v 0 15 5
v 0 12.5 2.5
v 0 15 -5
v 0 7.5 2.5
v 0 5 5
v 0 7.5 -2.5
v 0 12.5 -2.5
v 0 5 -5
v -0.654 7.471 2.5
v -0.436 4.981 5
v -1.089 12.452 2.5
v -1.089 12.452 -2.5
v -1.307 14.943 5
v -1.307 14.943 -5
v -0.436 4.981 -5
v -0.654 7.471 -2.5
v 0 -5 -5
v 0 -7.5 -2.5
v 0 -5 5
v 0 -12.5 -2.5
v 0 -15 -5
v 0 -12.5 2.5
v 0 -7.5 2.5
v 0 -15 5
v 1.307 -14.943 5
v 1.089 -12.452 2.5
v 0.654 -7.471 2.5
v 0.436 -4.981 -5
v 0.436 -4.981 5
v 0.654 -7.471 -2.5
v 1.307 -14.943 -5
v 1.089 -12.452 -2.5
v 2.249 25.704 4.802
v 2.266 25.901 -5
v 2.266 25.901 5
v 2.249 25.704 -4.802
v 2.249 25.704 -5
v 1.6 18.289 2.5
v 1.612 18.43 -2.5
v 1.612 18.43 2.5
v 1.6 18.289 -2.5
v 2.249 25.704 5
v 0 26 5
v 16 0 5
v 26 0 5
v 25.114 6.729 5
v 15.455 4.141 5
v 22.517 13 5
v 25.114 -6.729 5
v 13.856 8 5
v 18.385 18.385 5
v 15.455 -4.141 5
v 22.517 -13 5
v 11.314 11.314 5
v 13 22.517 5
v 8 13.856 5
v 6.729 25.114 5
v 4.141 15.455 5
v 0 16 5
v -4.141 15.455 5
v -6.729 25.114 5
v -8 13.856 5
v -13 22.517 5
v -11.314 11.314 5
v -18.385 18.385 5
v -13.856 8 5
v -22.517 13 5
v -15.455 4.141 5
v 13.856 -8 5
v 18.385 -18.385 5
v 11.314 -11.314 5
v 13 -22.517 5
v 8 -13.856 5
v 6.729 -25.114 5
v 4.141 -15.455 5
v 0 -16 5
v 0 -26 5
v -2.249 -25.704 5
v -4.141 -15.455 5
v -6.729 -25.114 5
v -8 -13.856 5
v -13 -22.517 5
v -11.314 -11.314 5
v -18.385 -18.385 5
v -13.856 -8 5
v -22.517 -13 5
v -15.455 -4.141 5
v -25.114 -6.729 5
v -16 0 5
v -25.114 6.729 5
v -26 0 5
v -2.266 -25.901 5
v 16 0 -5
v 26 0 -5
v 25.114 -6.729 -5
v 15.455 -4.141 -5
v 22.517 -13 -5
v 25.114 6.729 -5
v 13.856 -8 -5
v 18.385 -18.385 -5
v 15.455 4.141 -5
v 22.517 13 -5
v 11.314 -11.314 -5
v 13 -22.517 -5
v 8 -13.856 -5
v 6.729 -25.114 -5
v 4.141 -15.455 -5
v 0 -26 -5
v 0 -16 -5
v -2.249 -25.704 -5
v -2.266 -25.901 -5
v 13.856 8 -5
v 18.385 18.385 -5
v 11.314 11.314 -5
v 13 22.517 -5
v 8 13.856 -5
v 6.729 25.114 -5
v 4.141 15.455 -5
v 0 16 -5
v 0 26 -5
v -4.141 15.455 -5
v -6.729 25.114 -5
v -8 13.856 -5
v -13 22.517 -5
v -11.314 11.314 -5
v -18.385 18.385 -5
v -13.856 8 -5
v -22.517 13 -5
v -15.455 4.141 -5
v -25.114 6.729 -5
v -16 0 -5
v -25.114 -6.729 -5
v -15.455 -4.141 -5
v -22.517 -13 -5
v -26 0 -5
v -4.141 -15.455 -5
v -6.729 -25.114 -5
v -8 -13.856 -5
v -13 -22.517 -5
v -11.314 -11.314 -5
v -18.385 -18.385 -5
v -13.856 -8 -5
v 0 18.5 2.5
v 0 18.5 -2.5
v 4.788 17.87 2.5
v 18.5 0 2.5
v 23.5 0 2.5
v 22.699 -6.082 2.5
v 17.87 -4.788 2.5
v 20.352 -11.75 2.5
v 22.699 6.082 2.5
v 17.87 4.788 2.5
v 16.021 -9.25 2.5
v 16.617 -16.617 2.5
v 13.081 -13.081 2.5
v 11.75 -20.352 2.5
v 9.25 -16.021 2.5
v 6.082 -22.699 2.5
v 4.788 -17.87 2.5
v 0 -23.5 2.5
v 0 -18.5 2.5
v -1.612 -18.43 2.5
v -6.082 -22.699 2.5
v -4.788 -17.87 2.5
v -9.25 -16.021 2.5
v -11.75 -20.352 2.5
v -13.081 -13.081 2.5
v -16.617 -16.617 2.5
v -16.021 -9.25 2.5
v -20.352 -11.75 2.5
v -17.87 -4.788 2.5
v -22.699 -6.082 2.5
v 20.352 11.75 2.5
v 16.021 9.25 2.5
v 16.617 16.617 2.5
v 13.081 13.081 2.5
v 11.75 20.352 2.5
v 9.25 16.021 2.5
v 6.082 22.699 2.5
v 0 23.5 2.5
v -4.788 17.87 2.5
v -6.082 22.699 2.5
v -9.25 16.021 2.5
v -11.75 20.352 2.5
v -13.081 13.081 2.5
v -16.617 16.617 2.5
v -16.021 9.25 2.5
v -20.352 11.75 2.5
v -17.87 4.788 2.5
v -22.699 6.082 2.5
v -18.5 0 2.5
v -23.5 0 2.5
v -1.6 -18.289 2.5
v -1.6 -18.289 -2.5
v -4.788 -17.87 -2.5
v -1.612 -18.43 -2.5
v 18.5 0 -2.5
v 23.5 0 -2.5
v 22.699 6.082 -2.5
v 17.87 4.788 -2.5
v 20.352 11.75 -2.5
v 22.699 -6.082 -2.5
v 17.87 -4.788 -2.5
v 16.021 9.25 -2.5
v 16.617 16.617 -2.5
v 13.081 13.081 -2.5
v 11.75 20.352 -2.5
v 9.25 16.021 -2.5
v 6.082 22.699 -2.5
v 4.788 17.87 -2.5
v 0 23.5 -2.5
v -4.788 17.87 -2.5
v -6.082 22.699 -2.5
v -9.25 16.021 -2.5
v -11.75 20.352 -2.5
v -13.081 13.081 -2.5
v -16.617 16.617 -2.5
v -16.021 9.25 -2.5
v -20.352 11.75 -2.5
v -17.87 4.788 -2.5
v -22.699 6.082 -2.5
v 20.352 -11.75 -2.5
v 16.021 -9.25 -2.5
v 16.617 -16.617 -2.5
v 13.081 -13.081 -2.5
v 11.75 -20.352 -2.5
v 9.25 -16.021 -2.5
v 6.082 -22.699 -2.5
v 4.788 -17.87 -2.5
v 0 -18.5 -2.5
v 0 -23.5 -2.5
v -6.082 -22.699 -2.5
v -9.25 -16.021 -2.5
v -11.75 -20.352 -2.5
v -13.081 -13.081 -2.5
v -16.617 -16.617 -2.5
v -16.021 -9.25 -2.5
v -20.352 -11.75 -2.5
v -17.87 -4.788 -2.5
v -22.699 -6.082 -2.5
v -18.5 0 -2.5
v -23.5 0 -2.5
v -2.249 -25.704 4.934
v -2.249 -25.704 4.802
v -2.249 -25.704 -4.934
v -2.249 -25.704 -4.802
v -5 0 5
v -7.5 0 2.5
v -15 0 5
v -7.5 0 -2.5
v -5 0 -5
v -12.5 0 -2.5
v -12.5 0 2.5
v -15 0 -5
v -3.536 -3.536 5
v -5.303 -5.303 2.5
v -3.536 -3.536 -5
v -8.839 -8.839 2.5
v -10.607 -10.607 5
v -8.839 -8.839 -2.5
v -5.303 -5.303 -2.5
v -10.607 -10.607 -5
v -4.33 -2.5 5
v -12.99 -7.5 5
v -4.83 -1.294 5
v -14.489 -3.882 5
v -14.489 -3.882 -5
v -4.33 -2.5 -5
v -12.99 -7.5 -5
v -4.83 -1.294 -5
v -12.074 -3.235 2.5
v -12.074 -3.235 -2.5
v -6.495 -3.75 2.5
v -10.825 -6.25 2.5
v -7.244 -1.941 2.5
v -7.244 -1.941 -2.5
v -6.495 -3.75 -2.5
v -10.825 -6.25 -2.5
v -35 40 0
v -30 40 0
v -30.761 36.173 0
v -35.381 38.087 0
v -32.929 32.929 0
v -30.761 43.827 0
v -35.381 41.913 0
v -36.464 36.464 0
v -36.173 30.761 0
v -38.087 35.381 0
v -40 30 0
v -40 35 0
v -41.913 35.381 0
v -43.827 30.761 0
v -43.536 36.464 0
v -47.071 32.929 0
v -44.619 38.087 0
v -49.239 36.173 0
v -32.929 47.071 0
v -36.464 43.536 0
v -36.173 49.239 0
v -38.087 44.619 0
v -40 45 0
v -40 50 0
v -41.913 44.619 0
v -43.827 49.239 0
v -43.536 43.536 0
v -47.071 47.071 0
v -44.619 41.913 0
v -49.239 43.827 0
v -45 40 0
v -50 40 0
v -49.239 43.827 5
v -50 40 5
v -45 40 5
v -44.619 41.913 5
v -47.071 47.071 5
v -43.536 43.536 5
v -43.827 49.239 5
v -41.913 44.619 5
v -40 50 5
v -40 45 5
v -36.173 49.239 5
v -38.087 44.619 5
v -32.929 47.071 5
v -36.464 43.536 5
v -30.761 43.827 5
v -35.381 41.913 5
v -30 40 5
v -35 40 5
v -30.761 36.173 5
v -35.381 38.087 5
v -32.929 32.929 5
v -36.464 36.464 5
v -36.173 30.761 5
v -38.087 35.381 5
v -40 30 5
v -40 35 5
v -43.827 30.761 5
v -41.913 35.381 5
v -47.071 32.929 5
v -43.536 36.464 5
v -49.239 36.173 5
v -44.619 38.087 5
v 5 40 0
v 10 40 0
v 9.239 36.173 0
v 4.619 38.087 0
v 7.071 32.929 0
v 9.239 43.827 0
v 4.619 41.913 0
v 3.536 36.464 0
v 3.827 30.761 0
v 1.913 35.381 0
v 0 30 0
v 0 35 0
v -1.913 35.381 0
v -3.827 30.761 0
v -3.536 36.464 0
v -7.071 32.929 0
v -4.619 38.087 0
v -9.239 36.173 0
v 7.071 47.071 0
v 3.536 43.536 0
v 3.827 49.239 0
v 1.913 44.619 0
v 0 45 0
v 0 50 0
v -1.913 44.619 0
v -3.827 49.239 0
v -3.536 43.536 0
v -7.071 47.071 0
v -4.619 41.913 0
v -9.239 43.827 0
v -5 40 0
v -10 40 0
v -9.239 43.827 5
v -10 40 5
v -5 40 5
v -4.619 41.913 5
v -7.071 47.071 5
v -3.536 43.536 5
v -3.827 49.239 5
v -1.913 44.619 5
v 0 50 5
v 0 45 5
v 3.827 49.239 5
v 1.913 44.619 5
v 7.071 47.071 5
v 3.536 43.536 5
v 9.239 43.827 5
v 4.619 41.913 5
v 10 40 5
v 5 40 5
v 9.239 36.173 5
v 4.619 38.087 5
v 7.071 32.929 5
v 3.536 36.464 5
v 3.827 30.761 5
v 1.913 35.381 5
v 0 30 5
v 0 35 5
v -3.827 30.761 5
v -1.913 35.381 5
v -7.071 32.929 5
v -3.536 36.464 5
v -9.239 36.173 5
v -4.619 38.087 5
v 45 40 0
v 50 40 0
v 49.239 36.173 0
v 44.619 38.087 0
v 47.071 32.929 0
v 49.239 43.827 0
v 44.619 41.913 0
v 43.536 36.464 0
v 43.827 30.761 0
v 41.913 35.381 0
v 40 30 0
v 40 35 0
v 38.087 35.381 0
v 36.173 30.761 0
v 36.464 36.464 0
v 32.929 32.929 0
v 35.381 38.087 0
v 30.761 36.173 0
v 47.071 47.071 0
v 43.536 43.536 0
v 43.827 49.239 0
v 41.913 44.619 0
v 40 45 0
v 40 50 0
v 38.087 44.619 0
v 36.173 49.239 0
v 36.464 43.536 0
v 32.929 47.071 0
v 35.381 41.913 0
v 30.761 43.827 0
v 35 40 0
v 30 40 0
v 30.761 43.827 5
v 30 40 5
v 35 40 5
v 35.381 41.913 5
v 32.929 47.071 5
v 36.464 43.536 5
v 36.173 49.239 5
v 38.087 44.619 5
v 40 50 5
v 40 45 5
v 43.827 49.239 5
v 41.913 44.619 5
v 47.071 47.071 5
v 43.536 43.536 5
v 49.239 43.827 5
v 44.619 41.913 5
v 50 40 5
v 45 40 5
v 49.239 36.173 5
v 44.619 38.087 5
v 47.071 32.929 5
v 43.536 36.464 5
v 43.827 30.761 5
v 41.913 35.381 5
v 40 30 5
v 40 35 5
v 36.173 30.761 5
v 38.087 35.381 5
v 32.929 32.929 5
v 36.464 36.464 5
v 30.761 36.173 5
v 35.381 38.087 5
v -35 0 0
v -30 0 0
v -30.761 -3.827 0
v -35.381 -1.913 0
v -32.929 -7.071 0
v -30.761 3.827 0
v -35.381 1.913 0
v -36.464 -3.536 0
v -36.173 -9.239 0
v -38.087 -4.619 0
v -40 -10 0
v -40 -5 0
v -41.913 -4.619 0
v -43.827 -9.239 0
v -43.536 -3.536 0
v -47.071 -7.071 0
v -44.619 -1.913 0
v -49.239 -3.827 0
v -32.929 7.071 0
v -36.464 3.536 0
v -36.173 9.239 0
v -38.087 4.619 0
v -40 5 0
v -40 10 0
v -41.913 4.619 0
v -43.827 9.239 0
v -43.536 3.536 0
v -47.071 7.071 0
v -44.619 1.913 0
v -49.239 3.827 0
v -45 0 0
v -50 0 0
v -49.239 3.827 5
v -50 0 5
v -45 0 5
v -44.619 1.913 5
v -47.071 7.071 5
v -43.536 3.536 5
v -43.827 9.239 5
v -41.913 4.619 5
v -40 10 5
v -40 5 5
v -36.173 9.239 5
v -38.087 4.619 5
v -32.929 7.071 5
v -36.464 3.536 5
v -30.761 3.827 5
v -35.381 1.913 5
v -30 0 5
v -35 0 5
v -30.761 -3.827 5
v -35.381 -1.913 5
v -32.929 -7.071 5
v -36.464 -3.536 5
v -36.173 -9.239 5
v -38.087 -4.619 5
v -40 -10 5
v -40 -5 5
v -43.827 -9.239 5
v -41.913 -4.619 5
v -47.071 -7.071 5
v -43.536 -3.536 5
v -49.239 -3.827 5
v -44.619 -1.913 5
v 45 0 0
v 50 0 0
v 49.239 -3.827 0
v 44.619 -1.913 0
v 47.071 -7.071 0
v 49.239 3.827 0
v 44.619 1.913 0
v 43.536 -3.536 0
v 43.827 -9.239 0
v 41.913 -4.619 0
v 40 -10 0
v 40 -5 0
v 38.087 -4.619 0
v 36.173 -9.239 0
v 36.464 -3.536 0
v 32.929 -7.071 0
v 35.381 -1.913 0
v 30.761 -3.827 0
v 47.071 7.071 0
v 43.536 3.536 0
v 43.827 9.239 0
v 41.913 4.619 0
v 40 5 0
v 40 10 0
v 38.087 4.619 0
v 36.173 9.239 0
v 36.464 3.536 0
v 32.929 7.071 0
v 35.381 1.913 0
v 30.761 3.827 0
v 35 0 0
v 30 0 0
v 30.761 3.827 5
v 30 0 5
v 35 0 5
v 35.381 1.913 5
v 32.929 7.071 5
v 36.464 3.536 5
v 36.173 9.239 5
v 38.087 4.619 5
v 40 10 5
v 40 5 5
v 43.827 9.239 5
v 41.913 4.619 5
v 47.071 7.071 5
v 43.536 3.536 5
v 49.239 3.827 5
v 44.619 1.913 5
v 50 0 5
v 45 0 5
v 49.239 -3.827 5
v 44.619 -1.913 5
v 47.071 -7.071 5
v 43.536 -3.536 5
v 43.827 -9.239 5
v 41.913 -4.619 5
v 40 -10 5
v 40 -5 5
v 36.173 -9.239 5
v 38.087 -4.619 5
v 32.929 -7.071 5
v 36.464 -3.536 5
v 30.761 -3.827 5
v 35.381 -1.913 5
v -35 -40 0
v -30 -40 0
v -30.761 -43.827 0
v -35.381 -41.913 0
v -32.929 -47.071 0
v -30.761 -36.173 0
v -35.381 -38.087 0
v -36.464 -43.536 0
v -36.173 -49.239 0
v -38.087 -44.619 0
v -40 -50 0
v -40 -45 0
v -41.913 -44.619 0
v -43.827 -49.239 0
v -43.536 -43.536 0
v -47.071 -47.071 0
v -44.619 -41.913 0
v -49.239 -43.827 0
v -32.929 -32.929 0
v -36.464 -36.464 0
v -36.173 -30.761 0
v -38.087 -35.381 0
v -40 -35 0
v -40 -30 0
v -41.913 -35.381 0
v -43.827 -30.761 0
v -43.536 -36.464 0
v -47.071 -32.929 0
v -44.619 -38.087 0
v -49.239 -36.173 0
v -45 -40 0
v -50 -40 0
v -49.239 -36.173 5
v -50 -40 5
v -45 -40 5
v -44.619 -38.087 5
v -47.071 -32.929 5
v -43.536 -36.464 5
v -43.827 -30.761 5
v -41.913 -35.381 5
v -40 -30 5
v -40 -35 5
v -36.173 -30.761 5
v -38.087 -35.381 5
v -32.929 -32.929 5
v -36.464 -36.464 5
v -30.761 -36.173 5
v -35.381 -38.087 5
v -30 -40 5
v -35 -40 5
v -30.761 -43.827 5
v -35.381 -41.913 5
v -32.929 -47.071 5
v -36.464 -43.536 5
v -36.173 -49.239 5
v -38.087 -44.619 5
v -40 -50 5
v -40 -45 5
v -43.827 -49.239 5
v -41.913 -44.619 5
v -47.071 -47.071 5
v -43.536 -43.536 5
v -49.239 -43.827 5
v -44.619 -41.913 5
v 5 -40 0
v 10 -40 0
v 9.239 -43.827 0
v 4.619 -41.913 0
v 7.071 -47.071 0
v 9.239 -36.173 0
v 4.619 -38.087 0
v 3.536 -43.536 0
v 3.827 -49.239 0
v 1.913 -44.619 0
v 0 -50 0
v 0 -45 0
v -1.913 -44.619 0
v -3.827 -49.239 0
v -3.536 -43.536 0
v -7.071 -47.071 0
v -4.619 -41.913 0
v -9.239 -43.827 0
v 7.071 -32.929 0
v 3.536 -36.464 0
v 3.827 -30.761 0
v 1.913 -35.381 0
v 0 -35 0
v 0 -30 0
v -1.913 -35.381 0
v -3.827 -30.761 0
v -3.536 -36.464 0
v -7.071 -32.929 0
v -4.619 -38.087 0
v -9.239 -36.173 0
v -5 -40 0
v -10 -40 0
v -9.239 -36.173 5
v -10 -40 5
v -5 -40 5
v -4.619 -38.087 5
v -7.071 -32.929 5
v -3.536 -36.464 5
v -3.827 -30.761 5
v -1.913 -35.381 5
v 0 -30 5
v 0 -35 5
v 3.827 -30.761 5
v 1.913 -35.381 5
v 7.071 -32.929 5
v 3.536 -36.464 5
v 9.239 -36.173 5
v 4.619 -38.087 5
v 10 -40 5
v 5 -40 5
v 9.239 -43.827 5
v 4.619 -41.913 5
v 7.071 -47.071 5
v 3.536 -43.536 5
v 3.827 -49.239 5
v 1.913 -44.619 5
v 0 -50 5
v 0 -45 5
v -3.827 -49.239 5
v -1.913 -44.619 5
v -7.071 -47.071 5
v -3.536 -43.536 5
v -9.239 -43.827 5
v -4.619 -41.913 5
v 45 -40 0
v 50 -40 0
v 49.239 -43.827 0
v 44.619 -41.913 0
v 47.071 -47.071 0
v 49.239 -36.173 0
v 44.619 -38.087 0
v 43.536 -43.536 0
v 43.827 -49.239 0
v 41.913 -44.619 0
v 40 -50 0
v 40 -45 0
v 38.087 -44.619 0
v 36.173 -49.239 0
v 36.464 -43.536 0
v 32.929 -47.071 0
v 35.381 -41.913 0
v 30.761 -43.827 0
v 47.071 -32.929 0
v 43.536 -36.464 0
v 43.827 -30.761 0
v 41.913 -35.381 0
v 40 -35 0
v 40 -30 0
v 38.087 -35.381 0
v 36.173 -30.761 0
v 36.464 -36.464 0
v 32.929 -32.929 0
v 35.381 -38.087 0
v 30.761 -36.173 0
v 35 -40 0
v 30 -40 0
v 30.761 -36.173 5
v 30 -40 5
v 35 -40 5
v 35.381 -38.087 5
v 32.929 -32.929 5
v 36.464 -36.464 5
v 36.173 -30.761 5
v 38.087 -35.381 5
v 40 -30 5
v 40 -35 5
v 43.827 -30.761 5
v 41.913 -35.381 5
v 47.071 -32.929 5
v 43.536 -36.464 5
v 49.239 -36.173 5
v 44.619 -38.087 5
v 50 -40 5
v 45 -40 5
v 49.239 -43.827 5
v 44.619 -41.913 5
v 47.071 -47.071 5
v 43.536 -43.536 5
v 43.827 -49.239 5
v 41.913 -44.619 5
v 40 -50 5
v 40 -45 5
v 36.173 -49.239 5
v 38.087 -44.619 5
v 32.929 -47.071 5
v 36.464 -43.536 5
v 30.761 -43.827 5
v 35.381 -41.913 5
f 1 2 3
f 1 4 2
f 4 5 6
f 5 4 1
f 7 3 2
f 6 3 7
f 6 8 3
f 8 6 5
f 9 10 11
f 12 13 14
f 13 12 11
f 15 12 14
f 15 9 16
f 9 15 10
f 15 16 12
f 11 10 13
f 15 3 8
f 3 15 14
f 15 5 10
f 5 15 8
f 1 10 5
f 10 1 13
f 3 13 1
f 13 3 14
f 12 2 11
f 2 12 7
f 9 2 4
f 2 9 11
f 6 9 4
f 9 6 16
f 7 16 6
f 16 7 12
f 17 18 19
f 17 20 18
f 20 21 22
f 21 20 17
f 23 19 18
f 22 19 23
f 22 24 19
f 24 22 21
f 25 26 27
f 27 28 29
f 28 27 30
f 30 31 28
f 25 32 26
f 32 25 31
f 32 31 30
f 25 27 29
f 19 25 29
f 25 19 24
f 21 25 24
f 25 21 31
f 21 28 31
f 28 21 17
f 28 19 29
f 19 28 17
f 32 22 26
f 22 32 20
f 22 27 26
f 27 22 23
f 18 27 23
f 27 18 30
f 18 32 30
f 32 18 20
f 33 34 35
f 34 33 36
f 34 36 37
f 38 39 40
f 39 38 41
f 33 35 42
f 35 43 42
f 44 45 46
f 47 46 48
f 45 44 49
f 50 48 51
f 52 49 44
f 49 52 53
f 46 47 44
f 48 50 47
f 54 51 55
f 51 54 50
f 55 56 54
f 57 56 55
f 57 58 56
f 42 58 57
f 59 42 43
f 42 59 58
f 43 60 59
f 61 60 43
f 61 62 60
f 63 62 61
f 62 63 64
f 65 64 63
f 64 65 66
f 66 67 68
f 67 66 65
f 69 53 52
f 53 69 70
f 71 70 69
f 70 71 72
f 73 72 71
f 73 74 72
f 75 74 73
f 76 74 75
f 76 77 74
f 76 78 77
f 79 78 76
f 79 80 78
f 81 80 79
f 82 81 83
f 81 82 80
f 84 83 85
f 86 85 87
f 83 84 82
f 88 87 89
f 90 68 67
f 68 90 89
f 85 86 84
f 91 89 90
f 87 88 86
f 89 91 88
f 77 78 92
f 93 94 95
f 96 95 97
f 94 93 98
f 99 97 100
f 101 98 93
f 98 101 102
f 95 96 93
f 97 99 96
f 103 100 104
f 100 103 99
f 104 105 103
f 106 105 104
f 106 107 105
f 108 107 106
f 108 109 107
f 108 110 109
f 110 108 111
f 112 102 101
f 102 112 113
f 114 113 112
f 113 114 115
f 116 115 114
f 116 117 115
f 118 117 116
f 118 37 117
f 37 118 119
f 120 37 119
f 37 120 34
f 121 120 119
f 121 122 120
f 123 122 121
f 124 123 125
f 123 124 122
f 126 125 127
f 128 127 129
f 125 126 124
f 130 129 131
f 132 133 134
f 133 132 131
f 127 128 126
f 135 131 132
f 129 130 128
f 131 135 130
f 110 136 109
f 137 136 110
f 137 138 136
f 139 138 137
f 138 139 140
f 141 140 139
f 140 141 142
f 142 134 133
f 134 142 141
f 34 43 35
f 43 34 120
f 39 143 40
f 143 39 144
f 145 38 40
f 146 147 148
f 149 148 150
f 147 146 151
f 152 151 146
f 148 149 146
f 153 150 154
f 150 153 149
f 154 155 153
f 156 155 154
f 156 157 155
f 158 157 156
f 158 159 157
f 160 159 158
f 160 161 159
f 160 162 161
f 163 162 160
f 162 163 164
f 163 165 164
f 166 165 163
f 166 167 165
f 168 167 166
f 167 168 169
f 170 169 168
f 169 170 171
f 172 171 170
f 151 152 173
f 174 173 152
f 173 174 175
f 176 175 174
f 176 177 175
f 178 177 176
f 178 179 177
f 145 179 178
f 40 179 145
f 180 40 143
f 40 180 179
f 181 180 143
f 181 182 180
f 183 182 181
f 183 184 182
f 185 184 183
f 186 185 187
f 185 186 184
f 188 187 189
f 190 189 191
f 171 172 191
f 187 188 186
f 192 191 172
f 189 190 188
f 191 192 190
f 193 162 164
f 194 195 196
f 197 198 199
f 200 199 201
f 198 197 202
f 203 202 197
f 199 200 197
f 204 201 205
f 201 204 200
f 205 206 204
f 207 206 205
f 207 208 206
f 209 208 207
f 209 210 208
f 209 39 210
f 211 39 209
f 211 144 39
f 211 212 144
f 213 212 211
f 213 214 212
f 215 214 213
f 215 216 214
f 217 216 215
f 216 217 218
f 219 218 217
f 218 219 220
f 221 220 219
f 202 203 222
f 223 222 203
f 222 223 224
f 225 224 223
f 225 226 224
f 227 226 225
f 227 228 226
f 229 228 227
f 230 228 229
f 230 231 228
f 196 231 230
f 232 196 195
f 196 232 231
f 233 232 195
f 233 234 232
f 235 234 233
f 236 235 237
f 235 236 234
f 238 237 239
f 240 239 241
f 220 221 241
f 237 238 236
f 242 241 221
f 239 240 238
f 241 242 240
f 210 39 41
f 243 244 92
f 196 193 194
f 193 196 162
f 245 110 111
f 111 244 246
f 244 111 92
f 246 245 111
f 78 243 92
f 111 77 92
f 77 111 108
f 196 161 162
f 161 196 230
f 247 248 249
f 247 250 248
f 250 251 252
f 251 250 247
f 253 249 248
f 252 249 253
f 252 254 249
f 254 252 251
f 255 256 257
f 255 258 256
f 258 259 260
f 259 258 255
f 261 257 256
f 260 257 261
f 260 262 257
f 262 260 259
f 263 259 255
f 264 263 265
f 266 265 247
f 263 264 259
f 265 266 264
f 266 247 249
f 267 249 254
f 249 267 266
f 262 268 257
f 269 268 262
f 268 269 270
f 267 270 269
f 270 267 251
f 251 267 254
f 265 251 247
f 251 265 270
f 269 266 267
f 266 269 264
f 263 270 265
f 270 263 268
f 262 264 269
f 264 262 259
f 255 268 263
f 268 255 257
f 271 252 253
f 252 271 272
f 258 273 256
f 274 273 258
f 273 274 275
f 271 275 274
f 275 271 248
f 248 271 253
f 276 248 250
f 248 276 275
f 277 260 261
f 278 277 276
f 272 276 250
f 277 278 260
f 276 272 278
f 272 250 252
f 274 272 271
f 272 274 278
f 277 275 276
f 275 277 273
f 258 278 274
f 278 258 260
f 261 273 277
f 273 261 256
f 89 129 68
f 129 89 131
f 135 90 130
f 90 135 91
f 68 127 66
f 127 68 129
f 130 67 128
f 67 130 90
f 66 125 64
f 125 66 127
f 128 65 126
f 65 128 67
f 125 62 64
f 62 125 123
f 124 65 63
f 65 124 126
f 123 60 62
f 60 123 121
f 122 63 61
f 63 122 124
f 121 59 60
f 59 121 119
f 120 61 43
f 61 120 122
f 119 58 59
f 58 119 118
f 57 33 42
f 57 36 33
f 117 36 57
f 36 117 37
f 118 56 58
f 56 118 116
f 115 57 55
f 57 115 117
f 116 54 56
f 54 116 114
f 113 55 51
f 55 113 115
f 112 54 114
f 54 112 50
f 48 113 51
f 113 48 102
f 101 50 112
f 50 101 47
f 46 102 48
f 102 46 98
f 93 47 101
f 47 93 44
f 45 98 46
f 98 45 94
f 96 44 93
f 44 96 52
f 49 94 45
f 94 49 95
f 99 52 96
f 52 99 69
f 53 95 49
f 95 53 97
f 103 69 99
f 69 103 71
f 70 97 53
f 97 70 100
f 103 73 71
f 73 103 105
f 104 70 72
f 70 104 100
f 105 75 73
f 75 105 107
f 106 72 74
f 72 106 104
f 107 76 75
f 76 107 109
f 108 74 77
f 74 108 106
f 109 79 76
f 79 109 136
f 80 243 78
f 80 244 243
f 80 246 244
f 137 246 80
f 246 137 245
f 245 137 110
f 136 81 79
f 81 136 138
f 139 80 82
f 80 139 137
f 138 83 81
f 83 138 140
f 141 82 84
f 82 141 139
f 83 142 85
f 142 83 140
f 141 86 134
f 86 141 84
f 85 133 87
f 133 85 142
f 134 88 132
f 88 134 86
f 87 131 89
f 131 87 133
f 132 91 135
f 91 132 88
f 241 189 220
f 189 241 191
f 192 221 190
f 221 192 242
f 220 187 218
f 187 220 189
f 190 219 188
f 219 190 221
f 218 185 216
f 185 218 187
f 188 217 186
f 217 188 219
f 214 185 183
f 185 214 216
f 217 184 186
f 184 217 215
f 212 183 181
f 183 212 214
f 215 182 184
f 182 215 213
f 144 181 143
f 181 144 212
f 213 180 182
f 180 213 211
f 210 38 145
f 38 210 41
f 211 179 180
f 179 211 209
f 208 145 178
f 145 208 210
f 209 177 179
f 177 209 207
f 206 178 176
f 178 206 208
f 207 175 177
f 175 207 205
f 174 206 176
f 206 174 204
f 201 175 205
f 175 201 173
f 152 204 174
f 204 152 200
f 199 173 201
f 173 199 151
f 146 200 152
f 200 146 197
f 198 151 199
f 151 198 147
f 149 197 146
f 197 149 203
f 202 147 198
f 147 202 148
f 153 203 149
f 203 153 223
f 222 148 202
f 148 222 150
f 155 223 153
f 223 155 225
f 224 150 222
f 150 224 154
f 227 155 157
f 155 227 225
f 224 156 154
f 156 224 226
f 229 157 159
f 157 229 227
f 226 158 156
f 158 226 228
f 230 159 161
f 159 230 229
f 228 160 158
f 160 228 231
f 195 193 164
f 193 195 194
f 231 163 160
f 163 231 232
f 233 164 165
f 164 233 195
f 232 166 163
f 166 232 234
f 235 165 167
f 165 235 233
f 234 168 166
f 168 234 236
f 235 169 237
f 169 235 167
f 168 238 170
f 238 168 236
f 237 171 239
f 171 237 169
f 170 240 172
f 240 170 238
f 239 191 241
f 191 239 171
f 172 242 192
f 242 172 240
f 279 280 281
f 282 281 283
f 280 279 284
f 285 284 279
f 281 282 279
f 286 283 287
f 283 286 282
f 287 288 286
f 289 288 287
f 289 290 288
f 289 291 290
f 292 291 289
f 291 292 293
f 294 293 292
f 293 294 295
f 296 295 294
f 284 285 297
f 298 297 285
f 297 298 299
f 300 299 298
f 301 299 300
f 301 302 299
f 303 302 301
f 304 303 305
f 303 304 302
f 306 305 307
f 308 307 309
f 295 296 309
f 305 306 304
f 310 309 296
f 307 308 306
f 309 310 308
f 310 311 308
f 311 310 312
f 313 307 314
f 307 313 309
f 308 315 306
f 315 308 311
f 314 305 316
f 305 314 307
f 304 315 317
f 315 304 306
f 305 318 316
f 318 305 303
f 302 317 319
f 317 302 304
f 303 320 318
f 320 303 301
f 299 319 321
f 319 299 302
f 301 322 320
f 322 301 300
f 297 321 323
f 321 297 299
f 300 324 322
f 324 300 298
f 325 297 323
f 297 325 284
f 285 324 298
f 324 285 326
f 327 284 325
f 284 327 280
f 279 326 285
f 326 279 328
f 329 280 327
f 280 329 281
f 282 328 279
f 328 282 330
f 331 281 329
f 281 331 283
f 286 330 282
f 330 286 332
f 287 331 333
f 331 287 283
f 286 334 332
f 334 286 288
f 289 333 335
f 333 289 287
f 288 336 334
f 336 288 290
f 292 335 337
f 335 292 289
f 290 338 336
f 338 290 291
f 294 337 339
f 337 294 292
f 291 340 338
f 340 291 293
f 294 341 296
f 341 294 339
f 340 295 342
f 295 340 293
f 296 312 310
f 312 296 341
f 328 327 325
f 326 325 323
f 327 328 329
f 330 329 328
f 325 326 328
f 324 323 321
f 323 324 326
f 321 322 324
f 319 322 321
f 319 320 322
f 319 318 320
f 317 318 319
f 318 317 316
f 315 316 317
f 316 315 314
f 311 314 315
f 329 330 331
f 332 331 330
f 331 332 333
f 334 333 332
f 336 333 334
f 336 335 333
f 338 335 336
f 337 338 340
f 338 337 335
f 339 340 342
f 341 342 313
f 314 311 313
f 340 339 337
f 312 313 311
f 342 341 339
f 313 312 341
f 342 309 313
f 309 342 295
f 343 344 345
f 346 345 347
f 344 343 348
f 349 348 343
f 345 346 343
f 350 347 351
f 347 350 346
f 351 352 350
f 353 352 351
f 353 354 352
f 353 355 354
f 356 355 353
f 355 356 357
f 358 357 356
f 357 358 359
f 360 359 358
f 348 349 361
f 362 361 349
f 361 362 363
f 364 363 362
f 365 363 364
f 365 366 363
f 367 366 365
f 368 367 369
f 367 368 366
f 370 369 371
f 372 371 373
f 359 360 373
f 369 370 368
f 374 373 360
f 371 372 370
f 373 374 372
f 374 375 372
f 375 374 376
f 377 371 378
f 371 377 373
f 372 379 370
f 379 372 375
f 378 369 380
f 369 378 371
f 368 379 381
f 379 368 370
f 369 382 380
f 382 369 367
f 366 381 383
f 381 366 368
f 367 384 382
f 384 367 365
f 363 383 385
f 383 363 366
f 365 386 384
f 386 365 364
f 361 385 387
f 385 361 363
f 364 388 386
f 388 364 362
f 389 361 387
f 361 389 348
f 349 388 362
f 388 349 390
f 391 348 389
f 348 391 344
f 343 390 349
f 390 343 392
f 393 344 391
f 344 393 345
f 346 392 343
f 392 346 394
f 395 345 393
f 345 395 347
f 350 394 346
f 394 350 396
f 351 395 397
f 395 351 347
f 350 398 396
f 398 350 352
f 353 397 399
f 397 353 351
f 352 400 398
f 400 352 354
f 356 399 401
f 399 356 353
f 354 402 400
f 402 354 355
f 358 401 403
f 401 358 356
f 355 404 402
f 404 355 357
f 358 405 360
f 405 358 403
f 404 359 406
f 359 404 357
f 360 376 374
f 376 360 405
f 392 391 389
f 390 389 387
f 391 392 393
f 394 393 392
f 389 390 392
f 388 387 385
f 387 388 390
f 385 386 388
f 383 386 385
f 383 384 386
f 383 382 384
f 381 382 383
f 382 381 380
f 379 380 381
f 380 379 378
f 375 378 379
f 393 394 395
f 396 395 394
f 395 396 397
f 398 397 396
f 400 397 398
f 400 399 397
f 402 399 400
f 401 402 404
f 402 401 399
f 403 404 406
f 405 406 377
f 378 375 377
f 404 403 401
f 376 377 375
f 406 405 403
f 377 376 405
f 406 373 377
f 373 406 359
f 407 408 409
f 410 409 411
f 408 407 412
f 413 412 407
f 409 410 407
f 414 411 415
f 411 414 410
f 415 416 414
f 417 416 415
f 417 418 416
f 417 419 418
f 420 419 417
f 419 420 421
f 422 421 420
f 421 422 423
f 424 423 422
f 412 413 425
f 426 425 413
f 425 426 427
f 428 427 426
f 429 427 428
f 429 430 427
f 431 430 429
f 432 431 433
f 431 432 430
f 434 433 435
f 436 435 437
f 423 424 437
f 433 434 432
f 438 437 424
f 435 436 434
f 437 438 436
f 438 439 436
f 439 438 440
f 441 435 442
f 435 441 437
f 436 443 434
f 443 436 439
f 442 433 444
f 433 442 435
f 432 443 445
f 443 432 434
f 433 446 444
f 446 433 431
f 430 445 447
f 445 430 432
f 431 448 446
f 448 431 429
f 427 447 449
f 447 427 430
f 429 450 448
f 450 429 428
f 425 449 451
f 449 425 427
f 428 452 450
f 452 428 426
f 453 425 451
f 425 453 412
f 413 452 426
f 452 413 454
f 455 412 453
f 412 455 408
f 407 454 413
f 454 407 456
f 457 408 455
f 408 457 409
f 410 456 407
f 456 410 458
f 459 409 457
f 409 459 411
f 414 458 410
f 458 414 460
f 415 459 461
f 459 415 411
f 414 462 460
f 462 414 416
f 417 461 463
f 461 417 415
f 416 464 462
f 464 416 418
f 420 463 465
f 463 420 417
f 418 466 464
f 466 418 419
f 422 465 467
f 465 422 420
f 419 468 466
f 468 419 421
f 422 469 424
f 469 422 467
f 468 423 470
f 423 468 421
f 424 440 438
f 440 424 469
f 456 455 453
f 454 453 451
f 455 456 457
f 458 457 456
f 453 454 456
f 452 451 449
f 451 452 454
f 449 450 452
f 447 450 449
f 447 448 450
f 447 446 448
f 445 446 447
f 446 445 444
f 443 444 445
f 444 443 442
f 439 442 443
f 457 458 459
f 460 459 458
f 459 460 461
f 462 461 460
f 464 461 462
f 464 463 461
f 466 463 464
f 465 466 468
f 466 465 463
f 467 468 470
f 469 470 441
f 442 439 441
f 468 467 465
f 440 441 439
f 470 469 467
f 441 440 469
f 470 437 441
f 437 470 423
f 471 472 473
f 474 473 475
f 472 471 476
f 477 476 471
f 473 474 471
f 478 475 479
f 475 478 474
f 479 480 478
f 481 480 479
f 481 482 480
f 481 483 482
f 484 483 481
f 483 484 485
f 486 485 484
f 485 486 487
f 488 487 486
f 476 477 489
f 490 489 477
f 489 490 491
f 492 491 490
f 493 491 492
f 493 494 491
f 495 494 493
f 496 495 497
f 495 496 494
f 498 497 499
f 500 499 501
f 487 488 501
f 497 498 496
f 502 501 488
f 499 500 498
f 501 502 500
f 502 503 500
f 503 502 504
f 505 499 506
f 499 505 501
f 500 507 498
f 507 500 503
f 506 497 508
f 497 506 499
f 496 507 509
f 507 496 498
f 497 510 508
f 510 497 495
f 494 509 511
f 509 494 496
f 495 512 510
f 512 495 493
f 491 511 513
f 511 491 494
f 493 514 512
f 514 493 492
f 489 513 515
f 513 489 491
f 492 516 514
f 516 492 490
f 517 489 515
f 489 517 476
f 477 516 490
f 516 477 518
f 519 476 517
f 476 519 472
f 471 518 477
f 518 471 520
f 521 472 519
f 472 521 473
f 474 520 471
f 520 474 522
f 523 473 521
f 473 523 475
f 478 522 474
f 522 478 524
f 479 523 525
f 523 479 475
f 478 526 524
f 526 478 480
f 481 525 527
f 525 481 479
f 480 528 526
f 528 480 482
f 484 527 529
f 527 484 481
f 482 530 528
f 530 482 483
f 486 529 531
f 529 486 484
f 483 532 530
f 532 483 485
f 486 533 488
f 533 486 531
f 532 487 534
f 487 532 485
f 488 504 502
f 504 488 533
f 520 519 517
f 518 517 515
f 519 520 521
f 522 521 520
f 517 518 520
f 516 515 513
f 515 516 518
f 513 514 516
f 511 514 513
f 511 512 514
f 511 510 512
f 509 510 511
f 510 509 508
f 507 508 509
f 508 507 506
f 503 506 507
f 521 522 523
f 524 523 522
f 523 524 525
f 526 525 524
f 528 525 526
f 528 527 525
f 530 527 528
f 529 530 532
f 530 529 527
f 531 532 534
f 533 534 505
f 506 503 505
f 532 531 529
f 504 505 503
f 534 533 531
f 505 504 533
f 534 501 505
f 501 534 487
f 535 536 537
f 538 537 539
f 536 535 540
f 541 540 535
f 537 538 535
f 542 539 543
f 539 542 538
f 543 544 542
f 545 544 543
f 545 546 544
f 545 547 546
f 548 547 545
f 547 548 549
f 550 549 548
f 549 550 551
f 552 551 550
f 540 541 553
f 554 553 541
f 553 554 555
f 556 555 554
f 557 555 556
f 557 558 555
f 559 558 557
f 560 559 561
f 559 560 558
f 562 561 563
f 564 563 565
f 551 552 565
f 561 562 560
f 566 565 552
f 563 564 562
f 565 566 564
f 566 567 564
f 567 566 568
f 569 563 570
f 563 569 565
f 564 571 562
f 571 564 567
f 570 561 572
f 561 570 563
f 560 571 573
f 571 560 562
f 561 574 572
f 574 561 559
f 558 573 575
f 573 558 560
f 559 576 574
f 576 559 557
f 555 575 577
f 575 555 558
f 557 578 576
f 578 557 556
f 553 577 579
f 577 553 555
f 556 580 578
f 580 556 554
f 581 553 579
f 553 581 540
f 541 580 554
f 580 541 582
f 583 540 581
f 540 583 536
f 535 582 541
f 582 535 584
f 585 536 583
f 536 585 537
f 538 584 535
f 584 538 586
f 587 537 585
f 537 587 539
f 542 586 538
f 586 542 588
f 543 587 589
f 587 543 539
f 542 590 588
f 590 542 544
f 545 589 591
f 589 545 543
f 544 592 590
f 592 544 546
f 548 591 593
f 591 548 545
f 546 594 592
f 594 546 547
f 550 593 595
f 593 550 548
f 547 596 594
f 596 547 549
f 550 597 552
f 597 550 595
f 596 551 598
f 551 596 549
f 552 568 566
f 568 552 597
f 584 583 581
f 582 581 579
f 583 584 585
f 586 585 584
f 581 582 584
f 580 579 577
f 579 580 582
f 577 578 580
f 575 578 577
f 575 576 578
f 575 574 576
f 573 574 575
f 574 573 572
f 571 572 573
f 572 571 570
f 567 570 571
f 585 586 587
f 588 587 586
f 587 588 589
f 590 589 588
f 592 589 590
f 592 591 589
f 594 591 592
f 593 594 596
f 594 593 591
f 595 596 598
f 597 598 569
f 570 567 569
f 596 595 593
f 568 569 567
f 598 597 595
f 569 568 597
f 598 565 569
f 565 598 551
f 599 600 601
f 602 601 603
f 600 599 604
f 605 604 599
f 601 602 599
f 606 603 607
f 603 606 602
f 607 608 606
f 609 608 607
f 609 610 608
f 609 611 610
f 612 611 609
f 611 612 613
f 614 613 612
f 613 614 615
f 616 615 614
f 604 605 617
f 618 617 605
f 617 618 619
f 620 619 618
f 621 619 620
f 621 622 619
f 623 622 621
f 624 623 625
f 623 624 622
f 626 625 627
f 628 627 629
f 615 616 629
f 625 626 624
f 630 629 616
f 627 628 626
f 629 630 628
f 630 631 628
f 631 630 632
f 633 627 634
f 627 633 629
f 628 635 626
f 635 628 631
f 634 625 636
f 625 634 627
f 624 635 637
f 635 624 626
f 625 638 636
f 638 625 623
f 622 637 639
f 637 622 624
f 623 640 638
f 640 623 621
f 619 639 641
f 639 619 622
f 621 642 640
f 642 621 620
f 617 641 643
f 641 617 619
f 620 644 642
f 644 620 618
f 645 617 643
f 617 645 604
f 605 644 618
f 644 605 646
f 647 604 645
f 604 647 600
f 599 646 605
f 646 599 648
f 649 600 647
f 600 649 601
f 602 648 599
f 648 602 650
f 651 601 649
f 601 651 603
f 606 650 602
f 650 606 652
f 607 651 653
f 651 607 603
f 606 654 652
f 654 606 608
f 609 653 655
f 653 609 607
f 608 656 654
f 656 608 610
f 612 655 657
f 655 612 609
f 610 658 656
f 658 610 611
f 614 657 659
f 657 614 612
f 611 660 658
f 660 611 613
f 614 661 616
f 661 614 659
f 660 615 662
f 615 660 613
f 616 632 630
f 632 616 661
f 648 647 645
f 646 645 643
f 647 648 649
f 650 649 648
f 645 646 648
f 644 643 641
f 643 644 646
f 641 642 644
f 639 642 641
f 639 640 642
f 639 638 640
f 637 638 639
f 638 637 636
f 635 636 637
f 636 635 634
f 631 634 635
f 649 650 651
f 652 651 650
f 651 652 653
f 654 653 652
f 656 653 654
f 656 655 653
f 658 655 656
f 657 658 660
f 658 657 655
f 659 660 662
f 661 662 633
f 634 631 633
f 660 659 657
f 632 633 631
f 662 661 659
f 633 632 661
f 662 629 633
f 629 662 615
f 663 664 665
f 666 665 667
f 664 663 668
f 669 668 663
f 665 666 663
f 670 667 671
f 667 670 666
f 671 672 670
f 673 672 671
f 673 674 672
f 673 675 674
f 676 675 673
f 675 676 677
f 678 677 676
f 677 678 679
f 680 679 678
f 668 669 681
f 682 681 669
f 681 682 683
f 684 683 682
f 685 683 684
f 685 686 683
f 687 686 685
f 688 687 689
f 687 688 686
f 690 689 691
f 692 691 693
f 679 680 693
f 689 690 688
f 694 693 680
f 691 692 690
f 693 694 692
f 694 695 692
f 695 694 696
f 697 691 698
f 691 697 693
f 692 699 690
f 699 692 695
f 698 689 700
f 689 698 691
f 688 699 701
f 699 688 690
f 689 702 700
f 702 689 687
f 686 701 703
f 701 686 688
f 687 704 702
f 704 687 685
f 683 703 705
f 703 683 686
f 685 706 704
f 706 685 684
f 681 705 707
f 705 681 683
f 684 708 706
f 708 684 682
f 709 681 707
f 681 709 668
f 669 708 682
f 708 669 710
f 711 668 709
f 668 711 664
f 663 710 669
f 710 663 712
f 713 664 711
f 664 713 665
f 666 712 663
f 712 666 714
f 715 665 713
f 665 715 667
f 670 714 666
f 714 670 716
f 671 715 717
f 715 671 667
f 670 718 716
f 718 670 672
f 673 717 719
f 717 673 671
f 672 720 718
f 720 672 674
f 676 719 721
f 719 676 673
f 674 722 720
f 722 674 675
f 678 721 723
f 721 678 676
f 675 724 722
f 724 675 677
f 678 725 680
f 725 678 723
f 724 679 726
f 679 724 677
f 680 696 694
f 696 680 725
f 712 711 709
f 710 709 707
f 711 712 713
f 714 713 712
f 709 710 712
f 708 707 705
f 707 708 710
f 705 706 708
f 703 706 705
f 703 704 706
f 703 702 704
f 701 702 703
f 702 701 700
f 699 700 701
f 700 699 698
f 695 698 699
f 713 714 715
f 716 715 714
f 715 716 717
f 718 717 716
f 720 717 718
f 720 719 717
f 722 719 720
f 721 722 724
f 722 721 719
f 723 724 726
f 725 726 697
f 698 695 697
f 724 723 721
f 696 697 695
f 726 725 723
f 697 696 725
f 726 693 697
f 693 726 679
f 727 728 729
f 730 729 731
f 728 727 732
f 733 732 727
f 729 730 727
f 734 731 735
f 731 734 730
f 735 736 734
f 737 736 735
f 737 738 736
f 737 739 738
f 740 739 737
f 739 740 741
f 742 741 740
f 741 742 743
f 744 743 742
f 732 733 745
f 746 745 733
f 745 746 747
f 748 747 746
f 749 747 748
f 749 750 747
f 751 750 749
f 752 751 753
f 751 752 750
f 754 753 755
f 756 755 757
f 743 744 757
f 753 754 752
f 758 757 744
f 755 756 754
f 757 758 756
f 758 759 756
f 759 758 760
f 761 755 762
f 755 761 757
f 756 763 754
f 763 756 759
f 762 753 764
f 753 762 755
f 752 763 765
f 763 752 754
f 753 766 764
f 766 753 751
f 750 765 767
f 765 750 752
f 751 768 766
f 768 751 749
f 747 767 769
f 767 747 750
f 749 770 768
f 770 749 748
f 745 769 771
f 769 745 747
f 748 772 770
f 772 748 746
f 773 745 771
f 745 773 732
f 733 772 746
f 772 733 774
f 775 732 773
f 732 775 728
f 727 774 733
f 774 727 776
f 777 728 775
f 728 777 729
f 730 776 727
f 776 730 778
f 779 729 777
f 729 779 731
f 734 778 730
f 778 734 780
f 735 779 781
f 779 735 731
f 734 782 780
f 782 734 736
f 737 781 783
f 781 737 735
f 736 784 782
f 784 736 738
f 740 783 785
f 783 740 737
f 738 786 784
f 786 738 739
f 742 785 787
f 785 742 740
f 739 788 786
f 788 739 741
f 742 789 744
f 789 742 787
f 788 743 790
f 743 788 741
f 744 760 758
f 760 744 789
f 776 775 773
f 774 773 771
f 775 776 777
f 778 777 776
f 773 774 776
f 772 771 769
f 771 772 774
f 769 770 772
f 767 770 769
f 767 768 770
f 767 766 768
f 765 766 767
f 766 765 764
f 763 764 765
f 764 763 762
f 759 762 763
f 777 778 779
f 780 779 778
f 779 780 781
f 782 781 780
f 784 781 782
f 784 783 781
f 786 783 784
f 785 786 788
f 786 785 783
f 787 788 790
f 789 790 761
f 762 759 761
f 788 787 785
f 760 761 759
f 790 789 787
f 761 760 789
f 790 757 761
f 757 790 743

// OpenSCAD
// Volume: 13200.203765509517, SurfaceArea: 11844.752182512082
$fa=15;
$fs=4;

module face(x) {
  translate([x,0]) difference() {
    square(10,center=true);
    square(5,center=true);
  }
}

module face2() {
  translate([5,0]) square(5); 
}

// test negative partial angles and geometries on -X side
// Also:
// - First positional parameter is angle
// - Explicitly specify angle
// - "a" is an alias for "angle"
// - If both "angle" and "a" are specified, there's a warning and "angle" wins.
rotate_extrude(45) face(10);
rotate_extrude(angle=45) face(-10);
rotate_extrude(a=-45) face(21);
rotate_extrude(angle=-45, a=10) face(-21);

// test small angles, angle < $fa, render a single segment
rotate([0,0,90]) {
  rotate_extrude(angle=5) face(10); 
  rotate_extrude(angle=5) face(-10); 
  rotate_extrude(angle=-5) face(21); 
  rotate_extrude(angle=-5) face(-21);
}

// show nothing
rotate_extrude(angle=0) face(5); // 0 angle

// various angles treated as full circle
translate([-40,40]) rotate_extrude() face2(); // unspecified
translate([0,40]) rotate_extrude(angle=0/0) face2(); // NaN
translate([40,40]) rotate_extrude(angle=1/0) face2(); // Infinity
translate([-40,0]) rotate_extrude(angle=-1/0) face2(); // -Infinity
translate([40,0]) rotate_extrude(angle=360) face2(); // 360
translate([-40,-40]) rotate_extrude(angle=-360) face2(); // -360
translate([0,-40]) rotate_extrude(angle=1000) face2(); // > 360
translate([40,-40]) rotate_extrude(angle=-1000) face2(); // < -360
